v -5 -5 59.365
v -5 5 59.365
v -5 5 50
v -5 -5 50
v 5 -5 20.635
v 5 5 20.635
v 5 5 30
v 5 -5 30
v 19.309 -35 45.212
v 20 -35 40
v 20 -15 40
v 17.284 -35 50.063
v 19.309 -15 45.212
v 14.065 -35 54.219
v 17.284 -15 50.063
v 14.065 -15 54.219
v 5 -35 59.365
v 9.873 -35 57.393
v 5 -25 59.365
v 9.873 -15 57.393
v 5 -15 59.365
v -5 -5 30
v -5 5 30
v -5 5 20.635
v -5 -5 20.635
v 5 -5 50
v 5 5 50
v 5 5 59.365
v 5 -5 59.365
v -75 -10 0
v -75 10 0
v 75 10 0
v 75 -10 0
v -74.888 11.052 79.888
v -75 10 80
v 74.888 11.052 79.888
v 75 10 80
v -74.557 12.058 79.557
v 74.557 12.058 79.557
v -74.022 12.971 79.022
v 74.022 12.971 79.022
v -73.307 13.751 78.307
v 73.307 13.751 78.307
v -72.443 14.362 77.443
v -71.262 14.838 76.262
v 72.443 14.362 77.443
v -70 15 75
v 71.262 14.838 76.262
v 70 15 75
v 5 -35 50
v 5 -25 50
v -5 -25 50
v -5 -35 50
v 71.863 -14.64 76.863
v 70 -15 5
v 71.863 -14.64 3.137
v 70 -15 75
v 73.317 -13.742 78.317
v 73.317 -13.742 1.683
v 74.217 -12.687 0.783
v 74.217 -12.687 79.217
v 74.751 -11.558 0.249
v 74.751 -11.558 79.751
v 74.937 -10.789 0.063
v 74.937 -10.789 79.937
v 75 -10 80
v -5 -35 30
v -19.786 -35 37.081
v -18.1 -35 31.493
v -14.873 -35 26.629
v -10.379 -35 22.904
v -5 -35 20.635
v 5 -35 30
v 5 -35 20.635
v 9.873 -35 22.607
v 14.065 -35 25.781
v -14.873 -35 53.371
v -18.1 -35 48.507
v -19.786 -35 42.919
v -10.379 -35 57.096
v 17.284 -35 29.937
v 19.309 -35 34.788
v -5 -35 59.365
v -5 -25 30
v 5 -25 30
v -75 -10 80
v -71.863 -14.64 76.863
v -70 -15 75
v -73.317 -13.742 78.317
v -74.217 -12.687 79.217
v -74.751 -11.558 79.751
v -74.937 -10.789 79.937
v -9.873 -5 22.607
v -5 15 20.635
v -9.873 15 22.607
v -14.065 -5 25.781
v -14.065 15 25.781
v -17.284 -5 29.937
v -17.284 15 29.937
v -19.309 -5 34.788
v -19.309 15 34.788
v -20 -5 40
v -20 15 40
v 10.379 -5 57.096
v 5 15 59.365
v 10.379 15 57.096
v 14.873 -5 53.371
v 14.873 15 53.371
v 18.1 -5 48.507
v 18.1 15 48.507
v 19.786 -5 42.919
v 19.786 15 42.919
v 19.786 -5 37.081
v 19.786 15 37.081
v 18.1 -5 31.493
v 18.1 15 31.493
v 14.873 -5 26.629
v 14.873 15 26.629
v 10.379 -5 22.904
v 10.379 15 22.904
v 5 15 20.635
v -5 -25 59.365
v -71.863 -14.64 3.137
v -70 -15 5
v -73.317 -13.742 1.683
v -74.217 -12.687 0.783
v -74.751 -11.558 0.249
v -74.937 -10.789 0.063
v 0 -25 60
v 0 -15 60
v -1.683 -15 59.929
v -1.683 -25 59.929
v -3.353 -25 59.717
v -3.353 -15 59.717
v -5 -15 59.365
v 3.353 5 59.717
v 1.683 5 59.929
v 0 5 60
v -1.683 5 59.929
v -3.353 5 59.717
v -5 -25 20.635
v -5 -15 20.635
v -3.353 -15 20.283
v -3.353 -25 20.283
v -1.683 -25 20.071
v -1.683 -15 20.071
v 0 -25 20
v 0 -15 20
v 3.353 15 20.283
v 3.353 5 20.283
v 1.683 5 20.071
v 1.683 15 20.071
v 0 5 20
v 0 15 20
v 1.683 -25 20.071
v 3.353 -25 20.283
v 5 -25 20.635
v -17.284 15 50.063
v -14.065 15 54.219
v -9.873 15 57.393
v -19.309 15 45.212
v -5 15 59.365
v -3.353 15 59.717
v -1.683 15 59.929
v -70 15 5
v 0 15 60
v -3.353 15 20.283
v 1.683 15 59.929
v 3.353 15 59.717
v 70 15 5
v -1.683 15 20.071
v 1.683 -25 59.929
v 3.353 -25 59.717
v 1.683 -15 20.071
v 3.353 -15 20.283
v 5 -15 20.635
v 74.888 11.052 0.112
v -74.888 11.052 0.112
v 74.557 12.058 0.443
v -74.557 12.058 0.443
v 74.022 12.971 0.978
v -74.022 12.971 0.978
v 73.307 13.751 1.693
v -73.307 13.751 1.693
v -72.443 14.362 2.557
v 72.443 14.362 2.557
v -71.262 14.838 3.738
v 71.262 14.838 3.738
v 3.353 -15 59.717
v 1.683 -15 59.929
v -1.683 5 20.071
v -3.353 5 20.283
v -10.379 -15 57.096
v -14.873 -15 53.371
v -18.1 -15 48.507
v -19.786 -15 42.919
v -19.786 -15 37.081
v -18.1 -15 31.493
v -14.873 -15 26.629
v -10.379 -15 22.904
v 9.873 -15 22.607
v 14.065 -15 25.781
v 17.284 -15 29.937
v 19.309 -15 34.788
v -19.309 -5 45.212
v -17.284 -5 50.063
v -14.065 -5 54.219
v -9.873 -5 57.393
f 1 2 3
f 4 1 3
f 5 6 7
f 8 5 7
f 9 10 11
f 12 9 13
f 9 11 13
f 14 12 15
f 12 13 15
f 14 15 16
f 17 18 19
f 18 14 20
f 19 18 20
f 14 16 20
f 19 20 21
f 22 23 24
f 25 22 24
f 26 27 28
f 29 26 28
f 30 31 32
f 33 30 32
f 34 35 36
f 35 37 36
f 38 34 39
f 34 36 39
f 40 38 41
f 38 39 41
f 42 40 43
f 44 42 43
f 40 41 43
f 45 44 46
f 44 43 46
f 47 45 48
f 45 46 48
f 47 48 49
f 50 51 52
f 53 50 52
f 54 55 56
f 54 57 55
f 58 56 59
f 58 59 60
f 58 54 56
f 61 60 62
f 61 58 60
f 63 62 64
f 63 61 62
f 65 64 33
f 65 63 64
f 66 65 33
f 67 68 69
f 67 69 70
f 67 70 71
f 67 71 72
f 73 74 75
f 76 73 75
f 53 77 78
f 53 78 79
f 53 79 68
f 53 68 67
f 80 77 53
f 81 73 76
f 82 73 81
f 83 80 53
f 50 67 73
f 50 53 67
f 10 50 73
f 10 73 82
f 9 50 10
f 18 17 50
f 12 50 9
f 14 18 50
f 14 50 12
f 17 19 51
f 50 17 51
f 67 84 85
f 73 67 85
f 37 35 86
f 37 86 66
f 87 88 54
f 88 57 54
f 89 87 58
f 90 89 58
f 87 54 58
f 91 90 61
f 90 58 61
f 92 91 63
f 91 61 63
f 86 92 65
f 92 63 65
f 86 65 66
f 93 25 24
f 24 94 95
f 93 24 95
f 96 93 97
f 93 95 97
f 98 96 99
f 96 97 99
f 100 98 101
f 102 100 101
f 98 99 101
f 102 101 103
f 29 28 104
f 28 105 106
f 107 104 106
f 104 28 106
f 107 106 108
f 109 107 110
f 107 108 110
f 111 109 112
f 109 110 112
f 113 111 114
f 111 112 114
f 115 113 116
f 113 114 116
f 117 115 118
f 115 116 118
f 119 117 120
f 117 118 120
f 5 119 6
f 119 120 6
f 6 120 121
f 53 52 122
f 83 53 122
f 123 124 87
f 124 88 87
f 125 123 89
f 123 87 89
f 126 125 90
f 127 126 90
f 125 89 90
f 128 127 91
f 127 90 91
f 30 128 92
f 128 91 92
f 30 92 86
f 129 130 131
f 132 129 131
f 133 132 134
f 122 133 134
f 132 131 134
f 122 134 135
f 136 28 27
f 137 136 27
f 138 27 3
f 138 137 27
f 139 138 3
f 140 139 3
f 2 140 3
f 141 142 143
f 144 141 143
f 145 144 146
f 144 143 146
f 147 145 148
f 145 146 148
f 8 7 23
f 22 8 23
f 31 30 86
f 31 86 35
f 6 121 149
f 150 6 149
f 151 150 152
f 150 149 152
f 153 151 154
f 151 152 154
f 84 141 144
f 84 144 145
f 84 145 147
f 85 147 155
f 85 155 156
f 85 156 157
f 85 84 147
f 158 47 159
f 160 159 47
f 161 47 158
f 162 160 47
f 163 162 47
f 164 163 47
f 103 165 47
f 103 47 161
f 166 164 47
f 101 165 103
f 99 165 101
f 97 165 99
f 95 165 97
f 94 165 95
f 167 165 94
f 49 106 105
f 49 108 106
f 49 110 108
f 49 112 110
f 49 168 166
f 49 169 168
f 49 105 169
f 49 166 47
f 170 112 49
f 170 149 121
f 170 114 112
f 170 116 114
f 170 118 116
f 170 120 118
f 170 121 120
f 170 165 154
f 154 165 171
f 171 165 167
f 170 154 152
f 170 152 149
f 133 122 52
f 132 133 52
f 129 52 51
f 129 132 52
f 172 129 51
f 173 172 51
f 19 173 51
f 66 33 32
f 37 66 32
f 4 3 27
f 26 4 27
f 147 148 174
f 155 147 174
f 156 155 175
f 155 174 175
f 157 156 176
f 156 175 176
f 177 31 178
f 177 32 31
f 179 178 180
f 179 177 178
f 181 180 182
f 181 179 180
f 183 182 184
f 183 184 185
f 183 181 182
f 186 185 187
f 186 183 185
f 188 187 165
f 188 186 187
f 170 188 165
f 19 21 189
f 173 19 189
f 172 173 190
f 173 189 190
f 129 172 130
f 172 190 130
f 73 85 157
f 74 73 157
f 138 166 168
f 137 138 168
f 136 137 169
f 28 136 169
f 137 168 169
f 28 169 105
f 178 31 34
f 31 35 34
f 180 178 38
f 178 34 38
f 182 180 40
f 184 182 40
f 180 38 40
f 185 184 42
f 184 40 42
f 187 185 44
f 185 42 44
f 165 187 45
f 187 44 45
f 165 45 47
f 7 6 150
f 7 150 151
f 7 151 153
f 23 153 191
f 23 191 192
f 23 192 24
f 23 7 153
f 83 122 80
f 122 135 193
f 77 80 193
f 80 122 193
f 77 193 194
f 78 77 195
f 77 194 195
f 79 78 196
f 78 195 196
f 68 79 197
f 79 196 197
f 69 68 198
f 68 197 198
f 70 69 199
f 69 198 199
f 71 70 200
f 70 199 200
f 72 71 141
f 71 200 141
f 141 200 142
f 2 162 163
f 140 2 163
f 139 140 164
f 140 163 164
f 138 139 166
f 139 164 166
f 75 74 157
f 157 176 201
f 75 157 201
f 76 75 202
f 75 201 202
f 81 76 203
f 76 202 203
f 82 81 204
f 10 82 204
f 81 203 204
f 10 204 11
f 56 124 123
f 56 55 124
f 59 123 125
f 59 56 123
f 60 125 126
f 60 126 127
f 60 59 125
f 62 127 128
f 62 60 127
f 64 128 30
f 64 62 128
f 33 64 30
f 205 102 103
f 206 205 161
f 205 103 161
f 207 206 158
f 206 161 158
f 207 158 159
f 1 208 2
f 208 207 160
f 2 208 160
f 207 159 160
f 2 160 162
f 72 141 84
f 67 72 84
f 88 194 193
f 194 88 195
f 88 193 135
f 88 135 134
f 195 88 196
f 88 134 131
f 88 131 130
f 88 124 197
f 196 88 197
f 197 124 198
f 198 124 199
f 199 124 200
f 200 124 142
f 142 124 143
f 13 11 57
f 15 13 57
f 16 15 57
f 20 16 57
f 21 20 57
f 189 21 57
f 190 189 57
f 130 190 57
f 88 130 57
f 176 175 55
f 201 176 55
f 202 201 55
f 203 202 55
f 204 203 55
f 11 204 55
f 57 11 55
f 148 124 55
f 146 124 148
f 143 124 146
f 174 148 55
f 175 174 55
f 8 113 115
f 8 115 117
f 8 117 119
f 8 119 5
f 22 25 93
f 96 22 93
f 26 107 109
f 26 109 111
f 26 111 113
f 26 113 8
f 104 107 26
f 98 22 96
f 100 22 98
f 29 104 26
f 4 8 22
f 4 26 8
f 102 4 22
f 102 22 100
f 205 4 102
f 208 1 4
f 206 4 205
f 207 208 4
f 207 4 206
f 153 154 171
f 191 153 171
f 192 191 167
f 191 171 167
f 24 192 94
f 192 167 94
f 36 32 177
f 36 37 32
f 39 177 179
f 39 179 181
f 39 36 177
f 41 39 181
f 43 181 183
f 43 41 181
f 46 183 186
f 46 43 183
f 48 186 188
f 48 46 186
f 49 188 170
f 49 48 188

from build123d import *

# Parameters (mm, degrees)
F0_W     = 150
F0_H     = 30
F1_DEPTH = 80
F3_DEPTH = 20
F4_DEPTH = 10
F5_R     = 5
F7_DEPTH = 20
F8_DEPTH = 10


with BuildPart() as f1:
    # F0 (on Top) → F1 (new body)
    with BuildSketch(Plane.XY):
        Rectangle(F0_W, F0_H)
    extrude(amount=F1_DEPTH)

    # F2 (on face) → F3 (join)
    with BuildSketch(Plane.XZ.offset(15)):
        with BuildLine():
            ThreePointArc((5, 20.635083), (15.811388, 27.752551), (20, 40))
            ThreePointArc((20, 40), (15.811388, 52.247449), (5, 59.364917))
            Line((5, 59.364917), (5, 50))
            Line((5, 50), (0, 50))
            Line((0, 50), (-5, 50))
            Line((-5, 50), (-5, 59.364917))
            ThreePointArc((-5, 59.364917), (-20, 40), (-5, 20.635083))
            Line((-5, 20.635083), (-5, 30))
            Line((-5, 30), (0, 30))
            Line((0, 30), (5, 30))
            Line((5, 30), (5, 20.635083))
        make_face()
    extrude(amount=F3_DEPTH)

    # F2 (on face) → F4 (join)
    with BuildSketch(Plane.XZ.offset(15)):
        with BuildLine():
            Line((5, 50), (5, 59.364917))
            ThreePointArc((5, 59.364917), (2.520086, 59.840594), (0, 60))
            Line((0, 60), (0, 50))
            Line((0, 50), (5, 50))
        make_face()
        with BuildLine():
            Line((0, 50), (0, 60))
            ThreePointArc((0, 60), (-2.520086, 59.840594), (-5, 59.364917))
            Line((-5, 59.364917), (-5, 50))
            Line((-5, 50), (0, 50))
        make_face()
        with BuildLine():
            ThreePointArc((0, 20), (2.520086, 20.159406), (5, 20.635083))
            Line((5, 20.635083), (5, 30))
            Line((5, 30), (0, 30))
            Line((0, 30), (0, 20))
        make_face()
        with BuildLine():
            ThreePointArc((-5, 20.635083), (-2.520086, 20.159406), (0, 20))
            Line((0, 20), (0, 30))
            Line((0, 30), (-5, 30))
            Line((-5, 30), (-5, 20.635083))
        make_face()
    extrude(amount=F4_DEPTH)

    # F5
    f5_edges = [f1.edges().sort_by_distance(p)[0] for p in [
        (0, -15, 80),
        (0, 15, 80),
        (0, -15, 0),
        (0, 15, 0),
        (75, -15, 40),
        (75, 15, 40),
        (-75, -15, 40),
        (-75, 15, 40),
    ]]
    fillet(f5_edges, radius=F5_R)

    # F6 (on face) → F7 (cut)
    with BuildSketch(Plane(origin=(0, 15, 0), x_dir=(-1, 0, 0), z_dir=(0, 1, 0))):
        with BuildLine():
            ThreePointArc((5, 20.635083), (15.811388, 27.752551), (20, 40))
            ThreePointArc((20, 40), (15.811388, 52.247449), (5, 59.364917))
            Line((5, 59.364917), (5, 50))
            Line((5, 50), (0, 50))
            Line((0, 50), (-5, 50))
            Line((-5, 50), (-5, 59.364917))
            ThreePointArc((-5, 59.364917), (-20, 40), (-5, 20.635083))
            Line((-5, 20.635083), (-5, 30))
            Line((-5, 30), (0, 30))
            Line((0, 30), (5, 30))
            Line((5, 30), (5, 20.635083))
        make_face()
    extrude(amount=-F7_DEPTH, mode=Mode.SUBTRACT)

    # F6 (on face) → F8 (cut)
    with BuildSketch(Plane(origin=(0, 15, 0), x_dir=(-1, 0, 0), z_dir=(0, 1, 0))):
        with BuildLine():
            Line((5, 50), (5, 59.364917))
            ThreePointArc((5, 59.364917), (2.520086, 59.840594), (0, 60))
            Line((0, 60), (0, 50))
            Line((0, 50), (5, 50))
        make_face()
        with BuildLine():
            Line((0, 50), (0, 60))
            ThreePointArc((0, 60), (-2.520086, 59.840594), (-5, 59.364917))
            Line((-5, 59.364917), (-5, 50))
            Line((-5, 50), (0, 50))
        make_face()
        with BuildLine():
            ThreePointArc((0, 20), (2.520086, 20.159406), (5, 20.635083))
            Line((5, 20.635083), (5, 30))
            Line((5, 30), (0, 30))
            Line((0, 30), (0, 20))
        make_face()
        with BuildLine():
            ThreePointArc((-5, 20.635083), (-2.520086, 20.159406), (0, 20))
            Line((0, 20), (0, 30))
            Line((0, 30), (-5, 30))
            Line((-5, 30), (-5, 20.635083))
        make_face()
    extrude(amount=-F8_DEPTH, mode=Mode.SUBTRACT)


solid = f1.part
